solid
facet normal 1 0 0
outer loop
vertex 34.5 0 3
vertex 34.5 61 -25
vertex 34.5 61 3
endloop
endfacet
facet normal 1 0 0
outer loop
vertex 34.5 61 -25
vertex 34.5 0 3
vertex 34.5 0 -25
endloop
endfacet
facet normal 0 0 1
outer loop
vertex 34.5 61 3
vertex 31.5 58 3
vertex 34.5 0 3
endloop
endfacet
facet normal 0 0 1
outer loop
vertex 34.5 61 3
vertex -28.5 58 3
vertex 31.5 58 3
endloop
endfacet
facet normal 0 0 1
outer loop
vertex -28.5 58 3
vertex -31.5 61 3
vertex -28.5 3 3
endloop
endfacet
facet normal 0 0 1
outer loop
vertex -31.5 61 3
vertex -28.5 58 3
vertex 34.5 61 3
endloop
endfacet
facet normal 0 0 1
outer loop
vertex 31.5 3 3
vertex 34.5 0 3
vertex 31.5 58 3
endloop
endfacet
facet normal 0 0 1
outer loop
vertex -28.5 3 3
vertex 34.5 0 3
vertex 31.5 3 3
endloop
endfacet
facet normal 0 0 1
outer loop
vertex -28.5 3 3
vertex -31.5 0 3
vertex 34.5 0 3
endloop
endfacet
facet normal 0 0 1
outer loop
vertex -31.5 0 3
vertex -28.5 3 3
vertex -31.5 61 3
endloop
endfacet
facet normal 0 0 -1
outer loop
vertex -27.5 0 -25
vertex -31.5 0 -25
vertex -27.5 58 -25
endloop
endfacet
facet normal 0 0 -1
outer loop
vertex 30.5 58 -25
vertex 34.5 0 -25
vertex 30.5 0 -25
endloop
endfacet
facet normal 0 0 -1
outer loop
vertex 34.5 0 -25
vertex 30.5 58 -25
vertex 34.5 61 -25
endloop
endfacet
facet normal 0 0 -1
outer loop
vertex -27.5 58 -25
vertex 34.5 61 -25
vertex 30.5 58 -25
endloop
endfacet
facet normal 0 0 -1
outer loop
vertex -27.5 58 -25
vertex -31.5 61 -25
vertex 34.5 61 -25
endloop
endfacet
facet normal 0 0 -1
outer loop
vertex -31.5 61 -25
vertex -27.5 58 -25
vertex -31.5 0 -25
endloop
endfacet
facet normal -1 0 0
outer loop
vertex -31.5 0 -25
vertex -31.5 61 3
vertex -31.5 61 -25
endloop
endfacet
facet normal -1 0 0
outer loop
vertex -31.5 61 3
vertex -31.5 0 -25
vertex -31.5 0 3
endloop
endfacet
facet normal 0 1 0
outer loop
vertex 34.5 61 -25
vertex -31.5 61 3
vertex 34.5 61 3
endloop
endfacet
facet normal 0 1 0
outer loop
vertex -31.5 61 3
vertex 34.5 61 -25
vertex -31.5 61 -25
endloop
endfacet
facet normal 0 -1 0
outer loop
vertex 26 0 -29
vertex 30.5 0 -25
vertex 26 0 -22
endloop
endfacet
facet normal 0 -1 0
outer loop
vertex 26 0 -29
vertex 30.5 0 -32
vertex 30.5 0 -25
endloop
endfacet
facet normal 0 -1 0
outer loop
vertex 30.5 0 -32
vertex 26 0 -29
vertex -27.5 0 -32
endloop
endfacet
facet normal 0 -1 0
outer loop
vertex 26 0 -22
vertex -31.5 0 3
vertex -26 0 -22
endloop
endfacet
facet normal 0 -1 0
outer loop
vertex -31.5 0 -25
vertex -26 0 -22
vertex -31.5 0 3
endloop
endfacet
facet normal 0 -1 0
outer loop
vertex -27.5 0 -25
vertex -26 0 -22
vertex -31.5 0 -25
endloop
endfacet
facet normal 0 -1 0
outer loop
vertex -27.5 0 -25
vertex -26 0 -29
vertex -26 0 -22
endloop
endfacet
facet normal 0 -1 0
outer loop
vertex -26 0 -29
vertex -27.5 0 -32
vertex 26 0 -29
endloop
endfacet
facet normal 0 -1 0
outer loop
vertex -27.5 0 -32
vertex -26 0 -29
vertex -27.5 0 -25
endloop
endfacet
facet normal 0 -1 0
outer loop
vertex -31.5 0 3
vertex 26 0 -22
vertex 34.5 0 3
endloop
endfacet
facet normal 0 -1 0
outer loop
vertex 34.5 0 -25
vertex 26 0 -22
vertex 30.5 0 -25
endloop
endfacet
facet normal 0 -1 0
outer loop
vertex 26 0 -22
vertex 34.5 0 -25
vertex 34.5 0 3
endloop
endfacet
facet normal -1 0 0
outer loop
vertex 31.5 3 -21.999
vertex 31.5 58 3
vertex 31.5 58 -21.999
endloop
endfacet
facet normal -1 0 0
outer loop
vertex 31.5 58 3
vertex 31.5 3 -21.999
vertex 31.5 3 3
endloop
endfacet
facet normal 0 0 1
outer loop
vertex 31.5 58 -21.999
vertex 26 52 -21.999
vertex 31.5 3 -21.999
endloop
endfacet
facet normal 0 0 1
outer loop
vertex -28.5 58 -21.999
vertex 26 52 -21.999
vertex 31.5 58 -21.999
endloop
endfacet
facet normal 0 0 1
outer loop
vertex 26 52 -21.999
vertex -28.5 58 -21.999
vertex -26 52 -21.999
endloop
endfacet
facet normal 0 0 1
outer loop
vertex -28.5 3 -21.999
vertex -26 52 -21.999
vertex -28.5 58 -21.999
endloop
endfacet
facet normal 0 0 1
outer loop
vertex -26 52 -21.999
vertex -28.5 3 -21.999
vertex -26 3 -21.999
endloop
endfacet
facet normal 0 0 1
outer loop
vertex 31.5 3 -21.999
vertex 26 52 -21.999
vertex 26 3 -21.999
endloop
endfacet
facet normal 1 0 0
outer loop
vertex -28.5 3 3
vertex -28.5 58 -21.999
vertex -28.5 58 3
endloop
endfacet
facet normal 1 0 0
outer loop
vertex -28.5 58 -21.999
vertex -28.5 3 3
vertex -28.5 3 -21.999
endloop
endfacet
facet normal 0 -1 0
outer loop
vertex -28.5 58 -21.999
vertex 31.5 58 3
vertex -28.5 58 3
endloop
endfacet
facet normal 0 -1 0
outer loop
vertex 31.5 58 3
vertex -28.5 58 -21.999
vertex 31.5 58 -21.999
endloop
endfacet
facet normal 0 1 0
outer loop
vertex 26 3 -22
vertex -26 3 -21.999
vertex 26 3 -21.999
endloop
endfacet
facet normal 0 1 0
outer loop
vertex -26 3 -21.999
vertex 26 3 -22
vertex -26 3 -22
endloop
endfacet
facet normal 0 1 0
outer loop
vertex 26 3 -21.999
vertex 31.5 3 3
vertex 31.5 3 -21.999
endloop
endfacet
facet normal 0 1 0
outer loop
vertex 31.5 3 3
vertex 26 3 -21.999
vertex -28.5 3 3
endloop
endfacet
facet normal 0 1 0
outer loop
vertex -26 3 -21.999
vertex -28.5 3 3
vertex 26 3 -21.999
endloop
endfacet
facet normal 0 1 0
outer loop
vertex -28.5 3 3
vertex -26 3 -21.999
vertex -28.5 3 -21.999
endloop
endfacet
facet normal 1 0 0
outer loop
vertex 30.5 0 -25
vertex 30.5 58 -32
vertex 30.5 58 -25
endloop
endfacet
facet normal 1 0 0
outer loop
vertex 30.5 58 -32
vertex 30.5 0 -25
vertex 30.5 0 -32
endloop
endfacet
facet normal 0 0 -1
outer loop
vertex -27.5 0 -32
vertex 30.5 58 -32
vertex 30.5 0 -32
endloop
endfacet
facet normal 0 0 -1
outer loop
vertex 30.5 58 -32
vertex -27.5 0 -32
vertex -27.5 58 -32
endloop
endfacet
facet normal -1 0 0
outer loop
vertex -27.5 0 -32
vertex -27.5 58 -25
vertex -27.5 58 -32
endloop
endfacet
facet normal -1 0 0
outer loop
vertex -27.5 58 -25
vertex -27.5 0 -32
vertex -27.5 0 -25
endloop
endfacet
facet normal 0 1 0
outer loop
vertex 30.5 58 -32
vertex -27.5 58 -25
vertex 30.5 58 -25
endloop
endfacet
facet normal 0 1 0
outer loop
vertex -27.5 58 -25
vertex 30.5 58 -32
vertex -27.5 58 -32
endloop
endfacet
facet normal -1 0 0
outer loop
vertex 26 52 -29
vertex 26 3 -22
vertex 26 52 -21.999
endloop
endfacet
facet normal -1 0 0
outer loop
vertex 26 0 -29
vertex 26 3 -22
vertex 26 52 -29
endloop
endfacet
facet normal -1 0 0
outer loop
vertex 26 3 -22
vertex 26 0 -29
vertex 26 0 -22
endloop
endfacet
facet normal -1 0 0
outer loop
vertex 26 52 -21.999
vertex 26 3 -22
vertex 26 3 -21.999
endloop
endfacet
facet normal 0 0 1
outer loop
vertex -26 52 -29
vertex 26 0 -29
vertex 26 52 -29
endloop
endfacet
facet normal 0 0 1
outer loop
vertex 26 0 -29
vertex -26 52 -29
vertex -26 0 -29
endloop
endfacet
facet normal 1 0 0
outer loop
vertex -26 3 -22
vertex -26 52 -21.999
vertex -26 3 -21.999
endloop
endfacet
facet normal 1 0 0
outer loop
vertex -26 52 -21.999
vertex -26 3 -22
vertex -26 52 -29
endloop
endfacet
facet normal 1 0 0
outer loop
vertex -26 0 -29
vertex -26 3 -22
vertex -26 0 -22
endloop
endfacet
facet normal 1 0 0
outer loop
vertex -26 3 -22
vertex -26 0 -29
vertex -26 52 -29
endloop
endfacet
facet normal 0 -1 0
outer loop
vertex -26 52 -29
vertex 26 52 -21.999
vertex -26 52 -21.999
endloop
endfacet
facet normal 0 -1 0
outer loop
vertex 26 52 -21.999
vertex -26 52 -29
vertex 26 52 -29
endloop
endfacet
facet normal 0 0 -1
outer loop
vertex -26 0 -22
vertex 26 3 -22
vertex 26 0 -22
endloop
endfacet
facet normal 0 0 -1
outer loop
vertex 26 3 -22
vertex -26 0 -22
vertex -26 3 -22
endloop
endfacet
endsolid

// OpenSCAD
// file: extender_base.scad
/*battery=[60,55,25];

wall_thickness=3;

module __Customizer_Limit__ () {}*/

board=[52,52,7];

translate([0,0,-(board.z+battery.z)]) union() {
difference() {
union() {
	translate([-board.x/2 -wall_thickness/2, 0,0]) cube([board.x+wall_thickness*2,board.y+wall_thickness*2,board.z+wall_thickness]);

	translate([-battery.x/2 -wall_thickness/2, 0,board.z]) 
		difference() {
			cube([battery.x+wall_thickness*2,battery.y+wall_thickness*2,battery.z+wall_thickness]);
			translate([wall_thickness,wall_thickness,wall_thickness+0.001]) cube(battery);
	}
}
union() {
	translate([-board.x/2, wall_thickness, wall_thickness]) cube([board.x,board.y-wall_thickness,board.z+wall_thickness*2]);
	translate([-board.x/2, 0, wall_thickness]) cube([board.x,wall_thickness, board.z]);
}
}


//connector fill here 
}
// main file
phone=[80,165,10];

phone_corner_radius=15;

//distance from bottom to naerest of naerest button on the right
button_cutout_right_start=12;
//distance from bottom to farthest edge of farthest button on the right
button_cutout_right_stop=15;
//distance from bottom to farthest edge of farthest button on the left
button_cutout_left_start=0;
//distance from bottom to farthest edge of farthest button on the left
button_cutout_left_stop=0;

battery=[60,55,25];

wall_thickness=3;

module __Customizer_Limit__ () {}

include <extender_base.scad>

//lil thing around it here
